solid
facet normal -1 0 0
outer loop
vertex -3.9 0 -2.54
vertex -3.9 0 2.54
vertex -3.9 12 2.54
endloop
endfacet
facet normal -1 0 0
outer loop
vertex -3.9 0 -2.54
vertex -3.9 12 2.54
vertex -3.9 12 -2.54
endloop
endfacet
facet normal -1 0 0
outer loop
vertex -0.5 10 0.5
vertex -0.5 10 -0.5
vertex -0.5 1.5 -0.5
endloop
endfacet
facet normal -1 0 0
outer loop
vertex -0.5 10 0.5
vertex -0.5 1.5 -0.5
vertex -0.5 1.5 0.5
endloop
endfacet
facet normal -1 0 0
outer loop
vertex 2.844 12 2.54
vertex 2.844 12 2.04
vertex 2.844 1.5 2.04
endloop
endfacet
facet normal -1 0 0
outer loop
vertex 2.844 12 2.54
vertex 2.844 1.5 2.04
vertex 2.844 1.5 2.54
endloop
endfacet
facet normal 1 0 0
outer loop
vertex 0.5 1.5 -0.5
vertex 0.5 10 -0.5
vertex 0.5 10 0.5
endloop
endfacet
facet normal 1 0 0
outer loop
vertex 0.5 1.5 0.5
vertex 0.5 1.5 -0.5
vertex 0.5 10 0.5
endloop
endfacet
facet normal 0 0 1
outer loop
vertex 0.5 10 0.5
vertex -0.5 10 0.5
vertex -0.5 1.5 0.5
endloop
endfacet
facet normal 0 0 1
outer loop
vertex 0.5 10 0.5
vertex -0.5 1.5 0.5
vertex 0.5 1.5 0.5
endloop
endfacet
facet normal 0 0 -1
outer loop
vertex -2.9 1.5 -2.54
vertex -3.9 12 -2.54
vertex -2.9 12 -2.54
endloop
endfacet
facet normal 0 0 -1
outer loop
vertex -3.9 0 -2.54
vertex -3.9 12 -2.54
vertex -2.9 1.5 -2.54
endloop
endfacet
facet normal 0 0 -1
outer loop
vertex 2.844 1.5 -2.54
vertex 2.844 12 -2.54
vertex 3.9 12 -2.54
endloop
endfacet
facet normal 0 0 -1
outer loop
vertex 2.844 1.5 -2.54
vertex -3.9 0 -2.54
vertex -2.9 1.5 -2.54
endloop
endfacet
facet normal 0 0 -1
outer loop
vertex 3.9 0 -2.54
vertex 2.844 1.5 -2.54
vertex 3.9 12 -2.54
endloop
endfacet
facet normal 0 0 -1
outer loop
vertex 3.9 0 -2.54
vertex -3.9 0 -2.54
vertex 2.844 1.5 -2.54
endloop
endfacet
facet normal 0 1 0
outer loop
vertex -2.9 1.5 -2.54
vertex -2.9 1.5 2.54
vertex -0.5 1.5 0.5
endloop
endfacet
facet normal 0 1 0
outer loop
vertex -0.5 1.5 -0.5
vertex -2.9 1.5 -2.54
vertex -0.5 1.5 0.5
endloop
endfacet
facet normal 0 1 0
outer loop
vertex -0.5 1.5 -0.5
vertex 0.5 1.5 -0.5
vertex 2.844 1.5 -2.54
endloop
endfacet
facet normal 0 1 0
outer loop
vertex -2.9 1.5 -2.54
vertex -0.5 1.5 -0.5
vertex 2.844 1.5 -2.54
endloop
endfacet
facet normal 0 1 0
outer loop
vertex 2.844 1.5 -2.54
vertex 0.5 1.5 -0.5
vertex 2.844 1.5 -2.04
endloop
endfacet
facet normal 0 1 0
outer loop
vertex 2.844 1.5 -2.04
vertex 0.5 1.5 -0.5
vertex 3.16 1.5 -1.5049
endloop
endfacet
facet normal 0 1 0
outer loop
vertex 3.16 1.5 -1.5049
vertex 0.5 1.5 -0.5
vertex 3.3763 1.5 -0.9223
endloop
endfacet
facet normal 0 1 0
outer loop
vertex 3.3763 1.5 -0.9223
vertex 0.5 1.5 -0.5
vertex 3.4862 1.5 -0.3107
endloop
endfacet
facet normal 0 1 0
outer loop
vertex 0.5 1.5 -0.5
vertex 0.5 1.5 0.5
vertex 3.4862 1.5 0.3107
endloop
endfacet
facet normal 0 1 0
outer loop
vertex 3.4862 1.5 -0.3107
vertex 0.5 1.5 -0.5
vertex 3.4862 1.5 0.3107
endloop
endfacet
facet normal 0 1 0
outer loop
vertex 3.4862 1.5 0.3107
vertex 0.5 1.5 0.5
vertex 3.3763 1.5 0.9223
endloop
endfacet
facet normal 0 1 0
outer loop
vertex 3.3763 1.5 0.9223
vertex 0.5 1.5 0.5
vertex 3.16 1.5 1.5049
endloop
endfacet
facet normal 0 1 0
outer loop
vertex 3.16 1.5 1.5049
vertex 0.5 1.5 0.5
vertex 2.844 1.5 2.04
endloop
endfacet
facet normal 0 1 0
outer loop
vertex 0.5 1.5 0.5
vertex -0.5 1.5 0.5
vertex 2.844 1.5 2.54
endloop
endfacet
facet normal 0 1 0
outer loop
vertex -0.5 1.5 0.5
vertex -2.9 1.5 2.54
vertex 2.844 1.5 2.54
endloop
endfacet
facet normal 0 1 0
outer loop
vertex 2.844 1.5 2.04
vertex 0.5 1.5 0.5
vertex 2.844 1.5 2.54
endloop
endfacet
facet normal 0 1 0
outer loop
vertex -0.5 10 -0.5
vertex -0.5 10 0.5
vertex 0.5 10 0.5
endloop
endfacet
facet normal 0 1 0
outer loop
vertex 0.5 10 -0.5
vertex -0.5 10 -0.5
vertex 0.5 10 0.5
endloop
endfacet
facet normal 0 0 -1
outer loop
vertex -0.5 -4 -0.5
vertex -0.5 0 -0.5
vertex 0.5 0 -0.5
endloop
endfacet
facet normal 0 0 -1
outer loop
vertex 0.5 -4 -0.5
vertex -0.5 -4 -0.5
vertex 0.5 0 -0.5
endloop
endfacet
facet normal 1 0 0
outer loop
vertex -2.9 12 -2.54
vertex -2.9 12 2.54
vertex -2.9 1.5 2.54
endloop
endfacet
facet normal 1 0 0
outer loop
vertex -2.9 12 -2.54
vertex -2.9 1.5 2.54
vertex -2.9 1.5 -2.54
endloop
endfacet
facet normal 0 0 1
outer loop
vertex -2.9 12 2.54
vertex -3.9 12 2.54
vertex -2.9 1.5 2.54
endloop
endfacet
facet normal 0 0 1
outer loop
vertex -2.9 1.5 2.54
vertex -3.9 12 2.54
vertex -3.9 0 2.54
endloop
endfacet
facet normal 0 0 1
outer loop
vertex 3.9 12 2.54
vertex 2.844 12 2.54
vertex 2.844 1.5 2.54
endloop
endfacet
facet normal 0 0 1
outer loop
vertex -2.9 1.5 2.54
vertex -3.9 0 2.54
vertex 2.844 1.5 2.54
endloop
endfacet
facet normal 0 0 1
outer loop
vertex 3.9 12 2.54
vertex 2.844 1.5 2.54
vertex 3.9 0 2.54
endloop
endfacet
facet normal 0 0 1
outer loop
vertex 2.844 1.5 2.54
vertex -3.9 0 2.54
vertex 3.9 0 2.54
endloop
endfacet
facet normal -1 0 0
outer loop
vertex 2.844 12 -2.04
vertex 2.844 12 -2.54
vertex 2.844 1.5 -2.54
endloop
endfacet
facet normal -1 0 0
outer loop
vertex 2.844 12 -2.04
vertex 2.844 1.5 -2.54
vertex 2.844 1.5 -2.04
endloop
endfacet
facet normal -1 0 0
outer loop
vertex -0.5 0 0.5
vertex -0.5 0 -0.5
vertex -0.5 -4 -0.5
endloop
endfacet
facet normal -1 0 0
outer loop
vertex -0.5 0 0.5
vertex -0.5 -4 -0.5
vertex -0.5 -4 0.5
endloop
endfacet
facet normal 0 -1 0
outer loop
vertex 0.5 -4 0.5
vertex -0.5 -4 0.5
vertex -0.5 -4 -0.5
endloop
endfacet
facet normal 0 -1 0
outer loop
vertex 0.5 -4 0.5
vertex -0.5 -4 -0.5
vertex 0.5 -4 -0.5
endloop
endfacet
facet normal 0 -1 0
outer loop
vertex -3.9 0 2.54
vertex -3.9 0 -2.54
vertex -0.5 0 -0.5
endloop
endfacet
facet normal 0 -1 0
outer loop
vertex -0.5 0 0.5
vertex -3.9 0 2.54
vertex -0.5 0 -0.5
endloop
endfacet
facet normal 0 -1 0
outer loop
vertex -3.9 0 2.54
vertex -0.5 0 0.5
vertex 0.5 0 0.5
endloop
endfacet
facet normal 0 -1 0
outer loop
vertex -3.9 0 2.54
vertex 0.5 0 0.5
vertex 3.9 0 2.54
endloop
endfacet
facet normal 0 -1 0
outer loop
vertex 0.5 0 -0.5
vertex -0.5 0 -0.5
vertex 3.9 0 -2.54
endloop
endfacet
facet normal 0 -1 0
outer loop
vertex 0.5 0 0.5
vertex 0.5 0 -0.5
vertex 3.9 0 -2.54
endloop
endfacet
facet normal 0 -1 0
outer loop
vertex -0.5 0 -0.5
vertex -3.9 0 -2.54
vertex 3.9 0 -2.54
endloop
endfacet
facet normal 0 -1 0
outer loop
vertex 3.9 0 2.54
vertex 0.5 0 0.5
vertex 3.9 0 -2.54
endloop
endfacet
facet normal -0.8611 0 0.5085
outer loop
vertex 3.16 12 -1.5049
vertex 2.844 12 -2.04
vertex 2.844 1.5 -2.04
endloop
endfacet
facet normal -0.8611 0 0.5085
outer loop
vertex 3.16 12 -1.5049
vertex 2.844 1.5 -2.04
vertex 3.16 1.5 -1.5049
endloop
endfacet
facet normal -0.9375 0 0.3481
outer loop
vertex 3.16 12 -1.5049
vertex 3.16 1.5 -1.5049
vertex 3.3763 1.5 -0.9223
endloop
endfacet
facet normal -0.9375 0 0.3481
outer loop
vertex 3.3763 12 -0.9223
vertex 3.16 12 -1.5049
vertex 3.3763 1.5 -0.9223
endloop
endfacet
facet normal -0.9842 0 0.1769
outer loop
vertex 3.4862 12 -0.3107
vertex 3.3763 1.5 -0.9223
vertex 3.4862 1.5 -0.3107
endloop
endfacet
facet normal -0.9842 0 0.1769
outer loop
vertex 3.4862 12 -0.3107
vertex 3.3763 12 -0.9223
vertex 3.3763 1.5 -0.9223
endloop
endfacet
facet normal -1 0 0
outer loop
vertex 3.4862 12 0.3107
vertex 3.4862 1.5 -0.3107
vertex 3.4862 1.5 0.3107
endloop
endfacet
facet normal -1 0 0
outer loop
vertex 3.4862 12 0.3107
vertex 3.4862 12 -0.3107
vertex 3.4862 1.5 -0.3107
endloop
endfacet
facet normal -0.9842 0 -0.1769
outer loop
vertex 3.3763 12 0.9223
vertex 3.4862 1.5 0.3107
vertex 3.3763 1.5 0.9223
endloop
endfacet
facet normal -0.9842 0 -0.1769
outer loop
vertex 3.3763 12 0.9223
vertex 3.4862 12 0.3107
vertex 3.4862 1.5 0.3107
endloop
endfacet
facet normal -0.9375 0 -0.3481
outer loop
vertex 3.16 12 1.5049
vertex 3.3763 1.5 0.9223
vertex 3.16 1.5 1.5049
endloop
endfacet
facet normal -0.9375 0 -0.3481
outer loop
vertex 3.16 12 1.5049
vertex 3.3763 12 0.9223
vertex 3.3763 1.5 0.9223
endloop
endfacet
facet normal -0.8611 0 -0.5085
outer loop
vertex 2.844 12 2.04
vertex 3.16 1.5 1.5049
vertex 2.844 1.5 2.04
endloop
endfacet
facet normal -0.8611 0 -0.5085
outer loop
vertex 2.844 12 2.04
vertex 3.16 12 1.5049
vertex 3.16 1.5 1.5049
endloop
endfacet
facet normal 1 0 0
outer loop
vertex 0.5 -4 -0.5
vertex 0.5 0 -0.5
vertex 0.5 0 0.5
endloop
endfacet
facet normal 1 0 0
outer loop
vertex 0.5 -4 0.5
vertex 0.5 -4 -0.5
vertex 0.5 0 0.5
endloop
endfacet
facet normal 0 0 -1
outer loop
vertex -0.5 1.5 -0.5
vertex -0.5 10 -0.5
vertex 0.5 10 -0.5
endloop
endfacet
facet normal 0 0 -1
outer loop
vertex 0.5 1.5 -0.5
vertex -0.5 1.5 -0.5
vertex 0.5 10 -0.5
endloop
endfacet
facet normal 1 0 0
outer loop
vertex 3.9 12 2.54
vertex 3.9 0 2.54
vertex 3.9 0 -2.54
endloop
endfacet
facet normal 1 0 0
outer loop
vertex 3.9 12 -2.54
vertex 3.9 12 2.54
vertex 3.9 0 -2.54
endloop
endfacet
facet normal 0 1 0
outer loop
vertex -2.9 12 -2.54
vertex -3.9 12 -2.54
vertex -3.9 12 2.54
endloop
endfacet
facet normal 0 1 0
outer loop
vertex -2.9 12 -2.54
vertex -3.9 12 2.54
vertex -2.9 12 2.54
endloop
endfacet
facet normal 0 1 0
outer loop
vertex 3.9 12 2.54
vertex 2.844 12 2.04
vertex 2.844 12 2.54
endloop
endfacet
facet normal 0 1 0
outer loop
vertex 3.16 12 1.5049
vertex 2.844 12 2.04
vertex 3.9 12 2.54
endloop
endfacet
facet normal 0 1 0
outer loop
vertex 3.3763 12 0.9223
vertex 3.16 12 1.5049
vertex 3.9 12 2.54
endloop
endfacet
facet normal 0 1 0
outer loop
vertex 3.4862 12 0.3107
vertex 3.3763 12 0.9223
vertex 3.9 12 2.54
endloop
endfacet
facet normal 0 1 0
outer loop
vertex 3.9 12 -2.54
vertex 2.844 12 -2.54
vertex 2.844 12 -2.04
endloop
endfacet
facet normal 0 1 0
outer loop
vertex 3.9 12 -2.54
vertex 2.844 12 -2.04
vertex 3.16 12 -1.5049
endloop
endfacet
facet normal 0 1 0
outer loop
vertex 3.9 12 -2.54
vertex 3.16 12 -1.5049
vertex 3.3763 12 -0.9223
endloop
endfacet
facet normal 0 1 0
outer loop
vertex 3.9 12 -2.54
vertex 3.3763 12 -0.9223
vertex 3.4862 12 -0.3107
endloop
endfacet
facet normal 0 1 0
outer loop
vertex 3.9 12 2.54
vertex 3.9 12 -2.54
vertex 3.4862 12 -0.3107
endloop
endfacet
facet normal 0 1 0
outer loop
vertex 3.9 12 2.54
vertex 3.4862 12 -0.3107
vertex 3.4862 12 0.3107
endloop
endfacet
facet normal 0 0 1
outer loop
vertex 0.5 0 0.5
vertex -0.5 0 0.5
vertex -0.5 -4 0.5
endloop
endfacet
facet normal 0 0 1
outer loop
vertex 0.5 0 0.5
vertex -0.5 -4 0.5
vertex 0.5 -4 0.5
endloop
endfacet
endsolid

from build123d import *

# Parameters (mm, degrees)
SKETCH_1_W             = 7.8
SKETCH_1_H             = 5.08
EXTRUDE_1_DEPTH        = 12
CUT_EXTRUDE_1_DEPTH    = 10.5
EXTRUDE_1_2_DEPTH      = 4
EXTRUDE_1_2_DEPTH_BACK = 10
SKETCH_4_W             = 1
SKETCH_4_H             = 1


with BuildPart() as part:
    # 草图1 → Extrude 1 (new body)
    with BuildSketch(Plane(origin=(0, 0, 0), x_dir=(1, 0, 0), z_dir=(0, 1, 0))):
        Rectangle(SKETCH_1_W, SKETCH_1_H)
    extrude(amount=EXTRUDE_1_DEPTH)

    # 草图2 → 切除-拉伸1 (cut)
    with BuildSketch(Plane(origin=(0, 12, 0), x_dir=(-1, 0, 0), z_dir=(0, 1, 0))):
        with BuildLine():
            Line((-2.844011252, 2.04), (-2.844011252, 2.54))
            Line((-2.844011252, 2.54), (2.9, 2.54))
            Line((2.9, 2.54), (2.9, -2.54))
            Line((2.9, -2.54), (-2.844011252, -2.54))
            Line((-2.844011252, -2.54), (-2.844011252, -2.04))
            ThreePointArc((-2.844011252, -2.04), (-3.5, 0), (-2.844011252, 2.04))
        make_face()
    extrude(amount=-CUT_EXTRUDE_1_DEPTH, mode=Mode.SUBTRACT)

    # 草图4 → Extrude 1 2 (add, two sides: drawn at the far end of the back side and taken through both)
    with BuildSketch(Plane.XZ.offset(-EXTRUDE_1_2_DEPTH_BACK)):
        Rectangle(SKETCH_4_W, SKETCH_4_H)
    extrude(amount=EXTRUDE_1_2_DEPTH + EXTRUDE_1_2_DEPTH_BACK)


solid = part.part
